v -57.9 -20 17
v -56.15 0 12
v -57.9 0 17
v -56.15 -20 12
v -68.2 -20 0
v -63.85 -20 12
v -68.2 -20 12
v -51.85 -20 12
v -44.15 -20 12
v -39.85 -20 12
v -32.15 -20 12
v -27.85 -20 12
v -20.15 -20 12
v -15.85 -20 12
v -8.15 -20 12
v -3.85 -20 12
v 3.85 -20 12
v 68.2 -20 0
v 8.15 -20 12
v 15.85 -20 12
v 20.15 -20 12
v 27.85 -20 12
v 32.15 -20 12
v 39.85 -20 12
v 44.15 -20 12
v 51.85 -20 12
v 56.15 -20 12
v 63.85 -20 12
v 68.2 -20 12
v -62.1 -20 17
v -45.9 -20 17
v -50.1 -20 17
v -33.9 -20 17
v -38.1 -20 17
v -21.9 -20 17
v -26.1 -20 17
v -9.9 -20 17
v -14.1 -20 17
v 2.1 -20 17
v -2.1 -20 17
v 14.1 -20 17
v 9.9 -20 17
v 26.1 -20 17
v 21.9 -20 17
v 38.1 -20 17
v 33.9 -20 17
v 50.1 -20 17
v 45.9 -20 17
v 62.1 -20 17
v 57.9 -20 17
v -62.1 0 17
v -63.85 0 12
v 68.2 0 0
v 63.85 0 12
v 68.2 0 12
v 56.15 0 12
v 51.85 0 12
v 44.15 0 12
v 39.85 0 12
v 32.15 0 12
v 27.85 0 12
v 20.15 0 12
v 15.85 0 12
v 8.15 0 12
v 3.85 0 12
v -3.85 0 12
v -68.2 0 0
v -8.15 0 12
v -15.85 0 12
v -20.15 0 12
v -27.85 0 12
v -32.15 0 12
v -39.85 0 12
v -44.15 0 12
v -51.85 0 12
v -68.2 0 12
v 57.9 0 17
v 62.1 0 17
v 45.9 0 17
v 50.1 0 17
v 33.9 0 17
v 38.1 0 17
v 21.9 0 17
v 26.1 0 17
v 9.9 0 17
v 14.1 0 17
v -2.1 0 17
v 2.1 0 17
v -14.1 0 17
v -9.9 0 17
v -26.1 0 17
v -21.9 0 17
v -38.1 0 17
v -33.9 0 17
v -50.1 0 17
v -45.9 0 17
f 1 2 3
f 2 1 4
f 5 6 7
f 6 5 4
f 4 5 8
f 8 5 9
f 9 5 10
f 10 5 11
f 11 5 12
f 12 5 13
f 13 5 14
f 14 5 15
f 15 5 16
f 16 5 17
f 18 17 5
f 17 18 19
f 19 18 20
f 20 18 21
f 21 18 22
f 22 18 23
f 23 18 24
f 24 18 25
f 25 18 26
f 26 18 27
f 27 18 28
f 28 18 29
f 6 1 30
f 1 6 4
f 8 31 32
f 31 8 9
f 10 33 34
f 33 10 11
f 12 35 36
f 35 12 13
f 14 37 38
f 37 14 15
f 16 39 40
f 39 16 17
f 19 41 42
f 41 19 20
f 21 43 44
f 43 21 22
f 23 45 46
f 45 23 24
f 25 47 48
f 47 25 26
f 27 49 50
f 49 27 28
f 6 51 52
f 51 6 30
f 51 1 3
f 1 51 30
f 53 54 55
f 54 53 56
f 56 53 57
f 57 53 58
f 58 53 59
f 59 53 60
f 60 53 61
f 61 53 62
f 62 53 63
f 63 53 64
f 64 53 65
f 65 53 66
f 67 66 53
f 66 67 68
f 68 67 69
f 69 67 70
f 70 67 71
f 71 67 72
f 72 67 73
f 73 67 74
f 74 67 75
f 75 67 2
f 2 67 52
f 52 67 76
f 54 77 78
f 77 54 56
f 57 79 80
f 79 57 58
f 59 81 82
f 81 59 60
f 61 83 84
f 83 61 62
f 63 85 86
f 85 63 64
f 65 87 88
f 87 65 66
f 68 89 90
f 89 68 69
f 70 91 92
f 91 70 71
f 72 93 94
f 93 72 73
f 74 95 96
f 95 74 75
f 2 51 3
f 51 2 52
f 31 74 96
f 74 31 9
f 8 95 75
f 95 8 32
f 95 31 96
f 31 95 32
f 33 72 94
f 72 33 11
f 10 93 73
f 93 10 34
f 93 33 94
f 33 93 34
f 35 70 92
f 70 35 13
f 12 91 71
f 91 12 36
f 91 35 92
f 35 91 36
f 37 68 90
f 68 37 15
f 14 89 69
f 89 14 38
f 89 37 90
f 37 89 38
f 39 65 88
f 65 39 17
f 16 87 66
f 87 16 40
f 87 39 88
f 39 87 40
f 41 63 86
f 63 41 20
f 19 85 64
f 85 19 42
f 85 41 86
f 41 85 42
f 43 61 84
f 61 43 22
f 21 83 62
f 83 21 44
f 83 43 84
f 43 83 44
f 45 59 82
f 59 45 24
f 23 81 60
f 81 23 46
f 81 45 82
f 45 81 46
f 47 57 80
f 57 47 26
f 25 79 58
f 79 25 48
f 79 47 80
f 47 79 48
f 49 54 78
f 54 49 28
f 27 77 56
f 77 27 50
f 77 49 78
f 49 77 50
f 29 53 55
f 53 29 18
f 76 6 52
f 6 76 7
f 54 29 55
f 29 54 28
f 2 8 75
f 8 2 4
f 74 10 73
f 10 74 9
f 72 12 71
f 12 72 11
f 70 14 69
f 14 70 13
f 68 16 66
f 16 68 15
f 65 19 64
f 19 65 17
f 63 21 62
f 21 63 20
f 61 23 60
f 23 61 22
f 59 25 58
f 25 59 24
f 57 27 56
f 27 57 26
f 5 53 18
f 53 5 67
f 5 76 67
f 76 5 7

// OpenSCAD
$fn = 32;

// ----------------------------------------------------------------------
// Toothed rack, 11 teeth
// 12 mm pitch, 5 mm teeth
// ----------------------------------------------------------------------

// --- parameters (mm) ---
bar_w = 20;     // bar width (Y)
bar_h = 12;     // bar height (Z)
teeth = 11;     // number of teeth
pitch = 12;     // tooth pitch
tooth_h = 5;    // tooth height above the bar
root_w = 8.4;   // tooth width at the root
crest_w = 4.2;  // tooth width at the crest

// --- derived feature positions (mm) ---
span = (teeth - 1) * pitch;  // = 120   distance between the outer teeth
bar_l = span + root_w + 8;   // = 136.4   bar length: teeth plus 4 mm at each end
tooth_x = -span / 2;         // = -60   X of the first tooth
height = bar_h + tooth_h;    // = 17   overall height
feature_centers = [
  [tooth_x + 0 * pitch, -bar_w / 2],
  [tooth_x + 1 * pitch, -bar_w / 2],
  [tooth_x + 2 * pitch, -bar_w / 2],
  [tooth_x + 3 * pitch, -bar_w / 2],
  [tooth_x + 4 * pitch, -bar_w / 2],
  [tooth_x + 5 * pitch, -bar_w / 2],
  [tooth_x + 6 * pitch, -bar_w / 2],
  [tooth_x + 7 * pitch, -bar_w / 2],
  [tooth_x + 8 * pitch, -bar_w / 2],
  [tooth_x + 9 * pitch, -bar_w / 2],
  [tooth_x + 10 * pitch, -bar_w / 2]
];   // tooth centre line, drives the tooth loop

// bar with a rack of teeth, one extruded trapezoium per centre
module rack_tooth() {
  linear_extrude(height = bar_w)
    polygon(points = [
      [0, 0],
      [root_w, 0],
      [root_w / 2 + crest_w / 2, tooth_h + 1],
      [root_w / 2 - crest_w / 2, tooth_h + 1]
    ]);
}

union() {
  translate([-bar_l / 2, -bar_w, 0]) cube([bar_l, bar_w, bar_h]);
  for (centre = feature_centers)
    translate([centre[0] - root_w / 2, 0, bar_h - 1]) rotate([90, 0, 0]) rack_tooth();
}
